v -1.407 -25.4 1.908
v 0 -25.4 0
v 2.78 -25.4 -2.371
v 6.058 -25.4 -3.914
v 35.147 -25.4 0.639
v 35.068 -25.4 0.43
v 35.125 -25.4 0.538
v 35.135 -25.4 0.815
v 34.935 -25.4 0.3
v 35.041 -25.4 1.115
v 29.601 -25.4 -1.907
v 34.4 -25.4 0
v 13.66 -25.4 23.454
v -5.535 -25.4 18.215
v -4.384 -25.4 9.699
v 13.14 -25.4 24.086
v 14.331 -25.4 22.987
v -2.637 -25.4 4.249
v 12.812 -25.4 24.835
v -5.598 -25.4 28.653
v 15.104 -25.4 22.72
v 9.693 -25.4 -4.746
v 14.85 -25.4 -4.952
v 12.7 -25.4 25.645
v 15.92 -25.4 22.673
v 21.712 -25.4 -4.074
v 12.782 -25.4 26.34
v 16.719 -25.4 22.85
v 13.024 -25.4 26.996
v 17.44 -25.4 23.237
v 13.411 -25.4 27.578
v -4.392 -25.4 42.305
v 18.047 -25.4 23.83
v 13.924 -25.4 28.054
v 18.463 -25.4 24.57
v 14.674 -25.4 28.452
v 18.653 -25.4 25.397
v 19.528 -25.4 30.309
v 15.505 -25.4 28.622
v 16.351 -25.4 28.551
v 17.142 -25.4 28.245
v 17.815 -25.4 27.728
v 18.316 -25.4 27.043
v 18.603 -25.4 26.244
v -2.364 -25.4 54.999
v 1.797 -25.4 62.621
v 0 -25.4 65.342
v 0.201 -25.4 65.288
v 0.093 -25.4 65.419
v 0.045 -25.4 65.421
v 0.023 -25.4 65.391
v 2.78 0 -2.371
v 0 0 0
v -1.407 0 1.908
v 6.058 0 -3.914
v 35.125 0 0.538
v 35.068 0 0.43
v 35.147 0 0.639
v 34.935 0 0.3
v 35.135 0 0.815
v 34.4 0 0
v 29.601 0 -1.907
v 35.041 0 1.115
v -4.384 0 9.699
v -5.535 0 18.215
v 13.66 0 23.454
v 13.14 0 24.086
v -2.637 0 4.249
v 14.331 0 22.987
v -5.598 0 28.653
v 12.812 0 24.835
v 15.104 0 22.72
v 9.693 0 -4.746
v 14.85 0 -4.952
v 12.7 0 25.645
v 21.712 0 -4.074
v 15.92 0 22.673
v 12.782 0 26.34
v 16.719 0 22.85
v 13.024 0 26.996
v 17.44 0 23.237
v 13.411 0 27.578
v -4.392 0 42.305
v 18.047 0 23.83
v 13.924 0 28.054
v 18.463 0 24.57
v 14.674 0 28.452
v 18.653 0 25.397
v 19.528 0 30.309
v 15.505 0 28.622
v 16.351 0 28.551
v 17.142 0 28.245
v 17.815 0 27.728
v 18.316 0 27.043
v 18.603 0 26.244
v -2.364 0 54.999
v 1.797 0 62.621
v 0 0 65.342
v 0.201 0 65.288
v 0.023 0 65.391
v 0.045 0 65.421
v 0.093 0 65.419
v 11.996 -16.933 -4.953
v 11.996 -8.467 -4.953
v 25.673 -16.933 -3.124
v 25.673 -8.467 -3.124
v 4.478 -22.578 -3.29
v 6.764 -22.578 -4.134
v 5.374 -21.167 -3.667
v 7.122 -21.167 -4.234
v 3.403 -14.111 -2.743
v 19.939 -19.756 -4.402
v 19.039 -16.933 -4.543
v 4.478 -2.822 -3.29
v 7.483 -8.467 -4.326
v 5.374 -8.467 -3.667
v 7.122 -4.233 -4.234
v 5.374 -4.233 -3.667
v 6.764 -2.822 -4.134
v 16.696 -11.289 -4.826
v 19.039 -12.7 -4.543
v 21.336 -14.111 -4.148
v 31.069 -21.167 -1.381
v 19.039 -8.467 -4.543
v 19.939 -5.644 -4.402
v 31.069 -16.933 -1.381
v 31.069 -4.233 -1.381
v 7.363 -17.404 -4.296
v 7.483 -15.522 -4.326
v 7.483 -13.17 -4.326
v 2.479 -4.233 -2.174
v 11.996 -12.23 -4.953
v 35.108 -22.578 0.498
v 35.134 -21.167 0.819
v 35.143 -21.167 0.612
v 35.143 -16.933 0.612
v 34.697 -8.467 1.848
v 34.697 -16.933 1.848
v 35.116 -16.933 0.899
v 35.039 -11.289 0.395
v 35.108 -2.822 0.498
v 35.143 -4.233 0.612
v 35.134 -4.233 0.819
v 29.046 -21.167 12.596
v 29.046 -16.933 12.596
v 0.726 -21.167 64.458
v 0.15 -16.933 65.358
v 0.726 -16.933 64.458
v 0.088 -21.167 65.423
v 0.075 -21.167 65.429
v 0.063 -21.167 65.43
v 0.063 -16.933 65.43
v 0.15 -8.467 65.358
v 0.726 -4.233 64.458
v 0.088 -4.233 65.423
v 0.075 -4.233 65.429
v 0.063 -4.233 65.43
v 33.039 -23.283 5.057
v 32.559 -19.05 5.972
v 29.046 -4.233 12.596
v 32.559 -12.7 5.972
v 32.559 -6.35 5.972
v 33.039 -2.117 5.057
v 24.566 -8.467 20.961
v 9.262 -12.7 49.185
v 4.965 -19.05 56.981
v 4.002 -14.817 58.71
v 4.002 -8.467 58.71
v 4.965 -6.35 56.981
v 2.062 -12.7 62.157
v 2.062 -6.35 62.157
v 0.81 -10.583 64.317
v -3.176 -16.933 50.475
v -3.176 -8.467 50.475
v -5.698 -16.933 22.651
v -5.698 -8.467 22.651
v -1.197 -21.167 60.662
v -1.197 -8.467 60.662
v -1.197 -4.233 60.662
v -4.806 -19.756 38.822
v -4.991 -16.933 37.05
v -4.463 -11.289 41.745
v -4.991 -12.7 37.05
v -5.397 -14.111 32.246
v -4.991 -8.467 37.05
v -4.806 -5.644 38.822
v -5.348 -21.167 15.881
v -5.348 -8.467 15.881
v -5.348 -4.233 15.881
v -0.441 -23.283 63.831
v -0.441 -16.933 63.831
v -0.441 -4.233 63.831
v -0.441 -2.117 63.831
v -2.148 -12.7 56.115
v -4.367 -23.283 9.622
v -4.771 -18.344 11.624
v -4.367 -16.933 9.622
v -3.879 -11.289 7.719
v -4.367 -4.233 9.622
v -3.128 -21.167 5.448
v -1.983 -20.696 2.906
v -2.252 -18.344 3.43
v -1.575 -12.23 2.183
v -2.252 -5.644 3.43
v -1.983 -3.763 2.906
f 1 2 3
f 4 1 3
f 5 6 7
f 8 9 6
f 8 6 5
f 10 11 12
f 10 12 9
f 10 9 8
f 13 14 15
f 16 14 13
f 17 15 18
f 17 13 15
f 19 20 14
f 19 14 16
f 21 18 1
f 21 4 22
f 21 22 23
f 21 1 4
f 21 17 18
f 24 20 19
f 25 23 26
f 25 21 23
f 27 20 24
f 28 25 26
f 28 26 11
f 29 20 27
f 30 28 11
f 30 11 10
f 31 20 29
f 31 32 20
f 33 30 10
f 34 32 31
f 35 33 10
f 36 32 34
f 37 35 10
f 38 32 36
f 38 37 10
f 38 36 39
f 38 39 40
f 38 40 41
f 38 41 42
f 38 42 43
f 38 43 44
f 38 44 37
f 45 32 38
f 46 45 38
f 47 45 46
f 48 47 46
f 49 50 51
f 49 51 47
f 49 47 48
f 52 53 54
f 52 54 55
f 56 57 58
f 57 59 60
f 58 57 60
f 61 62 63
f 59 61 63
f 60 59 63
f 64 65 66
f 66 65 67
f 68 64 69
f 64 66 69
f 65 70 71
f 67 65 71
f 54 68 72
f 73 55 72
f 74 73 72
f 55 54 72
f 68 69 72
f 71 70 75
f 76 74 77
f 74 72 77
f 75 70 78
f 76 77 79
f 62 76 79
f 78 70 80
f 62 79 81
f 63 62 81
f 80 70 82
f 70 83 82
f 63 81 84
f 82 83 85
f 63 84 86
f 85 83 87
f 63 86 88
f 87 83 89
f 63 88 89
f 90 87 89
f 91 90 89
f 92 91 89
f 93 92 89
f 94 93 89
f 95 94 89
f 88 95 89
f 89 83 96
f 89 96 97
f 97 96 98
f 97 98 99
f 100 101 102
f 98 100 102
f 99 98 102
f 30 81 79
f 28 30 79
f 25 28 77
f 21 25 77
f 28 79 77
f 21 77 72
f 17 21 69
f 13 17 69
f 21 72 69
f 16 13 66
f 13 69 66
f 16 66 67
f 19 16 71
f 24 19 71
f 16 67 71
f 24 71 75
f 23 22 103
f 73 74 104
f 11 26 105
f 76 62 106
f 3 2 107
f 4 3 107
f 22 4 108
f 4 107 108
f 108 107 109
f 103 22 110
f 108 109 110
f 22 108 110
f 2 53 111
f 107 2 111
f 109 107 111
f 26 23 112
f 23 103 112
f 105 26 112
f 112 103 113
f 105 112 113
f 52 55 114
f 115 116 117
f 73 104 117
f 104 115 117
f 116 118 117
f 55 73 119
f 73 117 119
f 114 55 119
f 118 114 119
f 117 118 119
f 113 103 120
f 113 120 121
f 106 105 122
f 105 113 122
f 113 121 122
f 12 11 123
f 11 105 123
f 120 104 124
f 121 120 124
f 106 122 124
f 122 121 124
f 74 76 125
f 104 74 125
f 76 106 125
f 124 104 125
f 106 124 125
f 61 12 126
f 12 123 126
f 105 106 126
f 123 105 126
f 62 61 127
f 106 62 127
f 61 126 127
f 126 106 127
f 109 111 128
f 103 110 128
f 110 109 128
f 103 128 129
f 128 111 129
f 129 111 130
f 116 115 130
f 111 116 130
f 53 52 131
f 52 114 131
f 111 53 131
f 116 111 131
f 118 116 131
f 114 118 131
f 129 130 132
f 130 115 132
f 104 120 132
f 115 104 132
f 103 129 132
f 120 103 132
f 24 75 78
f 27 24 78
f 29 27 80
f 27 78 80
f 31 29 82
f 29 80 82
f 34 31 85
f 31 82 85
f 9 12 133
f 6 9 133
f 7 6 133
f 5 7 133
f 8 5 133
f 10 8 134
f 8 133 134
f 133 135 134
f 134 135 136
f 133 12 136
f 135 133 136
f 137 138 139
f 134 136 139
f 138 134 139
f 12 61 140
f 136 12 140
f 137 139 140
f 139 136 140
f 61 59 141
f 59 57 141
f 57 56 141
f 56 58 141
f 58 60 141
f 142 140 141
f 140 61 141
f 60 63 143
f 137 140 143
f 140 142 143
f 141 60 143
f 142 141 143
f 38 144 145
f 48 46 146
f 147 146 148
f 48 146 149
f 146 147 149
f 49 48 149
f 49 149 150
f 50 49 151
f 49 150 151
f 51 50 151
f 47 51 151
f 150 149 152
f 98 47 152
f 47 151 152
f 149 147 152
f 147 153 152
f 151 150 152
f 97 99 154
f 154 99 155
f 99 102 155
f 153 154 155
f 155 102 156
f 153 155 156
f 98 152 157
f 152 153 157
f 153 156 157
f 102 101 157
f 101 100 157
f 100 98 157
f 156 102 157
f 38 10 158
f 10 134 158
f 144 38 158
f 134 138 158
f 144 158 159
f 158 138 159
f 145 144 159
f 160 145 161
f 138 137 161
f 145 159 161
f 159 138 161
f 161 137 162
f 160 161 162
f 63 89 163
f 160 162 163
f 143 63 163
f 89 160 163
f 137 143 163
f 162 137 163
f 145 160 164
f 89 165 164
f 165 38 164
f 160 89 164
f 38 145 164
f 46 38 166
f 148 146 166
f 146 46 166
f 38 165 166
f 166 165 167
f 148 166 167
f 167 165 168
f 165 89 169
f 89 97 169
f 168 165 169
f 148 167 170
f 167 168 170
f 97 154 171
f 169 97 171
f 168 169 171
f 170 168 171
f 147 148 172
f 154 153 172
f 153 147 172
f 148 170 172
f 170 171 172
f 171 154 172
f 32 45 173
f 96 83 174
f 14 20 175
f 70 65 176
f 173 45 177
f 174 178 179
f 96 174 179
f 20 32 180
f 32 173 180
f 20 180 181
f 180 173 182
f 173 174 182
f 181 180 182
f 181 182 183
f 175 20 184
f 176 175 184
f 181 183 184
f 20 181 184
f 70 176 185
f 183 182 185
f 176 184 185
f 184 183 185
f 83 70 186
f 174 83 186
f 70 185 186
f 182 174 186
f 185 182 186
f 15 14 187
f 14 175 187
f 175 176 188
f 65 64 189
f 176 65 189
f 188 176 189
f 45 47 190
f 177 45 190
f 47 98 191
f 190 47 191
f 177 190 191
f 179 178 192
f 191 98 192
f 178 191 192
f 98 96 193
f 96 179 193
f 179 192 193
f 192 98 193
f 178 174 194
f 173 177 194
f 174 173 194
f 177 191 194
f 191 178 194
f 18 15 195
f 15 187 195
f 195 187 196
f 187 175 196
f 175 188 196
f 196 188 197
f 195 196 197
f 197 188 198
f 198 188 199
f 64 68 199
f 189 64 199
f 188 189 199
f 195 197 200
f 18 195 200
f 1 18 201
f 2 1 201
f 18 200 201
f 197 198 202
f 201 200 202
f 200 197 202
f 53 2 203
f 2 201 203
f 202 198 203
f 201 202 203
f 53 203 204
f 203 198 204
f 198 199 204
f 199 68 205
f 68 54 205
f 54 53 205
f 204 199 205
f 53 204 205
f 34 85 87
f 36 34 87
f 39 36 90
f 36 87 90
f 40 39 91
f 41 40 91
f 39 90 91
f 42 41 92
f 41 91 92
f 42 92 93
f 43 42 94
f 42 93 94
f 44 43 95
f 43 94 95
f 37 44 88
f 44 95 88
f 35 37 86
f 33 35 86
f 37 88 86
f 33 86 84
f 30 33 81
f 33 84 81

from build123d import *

# Parameters (mm, degrees)
F1_DEPTH = 25.4
F3_DEPTH = 25.4


with BuildPart() as f1:
    # F0 (on Front) → F1 (new body)
    with BuildSketch(Plane.XZ):
        with BuildLine():
            add(Edge.make_bspline(
                [(0, 65.3415620327), (-0.9807187623, 62.9984271725), (-12.3293417478, 14.0205244221), (0, 0)],
                knots=[0, 0, 0, 0, 0.333918082, 0.333918082, 0.333918082, 0.333918082], degree=3))
            Line((0, 0), (0, 65.3415620327))
        make_face()
        with BuildLine():
            Line((0, 65.3415620327), (0, 0))
            Line((0, 0), (34.3999378383, 0))
            add(Edge.make_bspline(
                [(34.3999378383, 0), (35.3429576773, 0.4530598594), (35.3275782315, 1.2528593088), (0.5780810952, 65.5676734241), (0.0471041991, 65.4541034617), (0, 65.3415620327)],
                knots=[0.5762016774, 0.5762016774, 0.5762016774, 0.5762016774, 0.6327198794, 0.9839618202, 1, 1, 1, 1], degree=3))
        make_face()
        with BuildLine():
            Line((34.3999378383, 0), (0, 0))
            add(Edge.make_bspline(
                [(0, 0), (8.9458984378, -10.1729832858), (30.3573775814, -1.9421879647), (34.3999378383, 0)],
                knots=[0.333918082, 0.333918082, 0.333918082, 0.333918082, 0.5762016774, 0.5762016774, 0.5762016774, 0.5762016774], degree=3))
        make_face()
    extrude(amount=F1_DEPTH)

    # F2 (on face) → F3 (cut, through all)
    with BuildSketch(Plane(origin=(0, 0, 0), x_dir=(-1, 0, 0), z_dir=(0, 1, 0))):
        with BuildLine():
            ThreePointArc((-13.9238198233, 28.0538285248), (-18.0900508109, 27.4032922149), (-17.439514501, 23.2370612274))
            Line((-17.439514501, 23.2370612274), (-13.9238198233, 28.0538285248))
        make_face()
        with BuildLine():
            Line((-13.9238198233, 28.0538285248), (-17.439514501, 23.2370612274))
            ThreePointArc((-17.439514501, 23.2370612274), (-14.3309222973, 22.9872824702), (-12.7, 25.6454448761))
            ThreePointArc((-12.7, 25.6454448761), (-13.0235047563, 26.9961897409), (-13.9238198233, 28.0538285248))
        make_face()
    extrude(amount=-F3_DEPTH, mode=Mode.SUBTRACT)


solid = f1.part
